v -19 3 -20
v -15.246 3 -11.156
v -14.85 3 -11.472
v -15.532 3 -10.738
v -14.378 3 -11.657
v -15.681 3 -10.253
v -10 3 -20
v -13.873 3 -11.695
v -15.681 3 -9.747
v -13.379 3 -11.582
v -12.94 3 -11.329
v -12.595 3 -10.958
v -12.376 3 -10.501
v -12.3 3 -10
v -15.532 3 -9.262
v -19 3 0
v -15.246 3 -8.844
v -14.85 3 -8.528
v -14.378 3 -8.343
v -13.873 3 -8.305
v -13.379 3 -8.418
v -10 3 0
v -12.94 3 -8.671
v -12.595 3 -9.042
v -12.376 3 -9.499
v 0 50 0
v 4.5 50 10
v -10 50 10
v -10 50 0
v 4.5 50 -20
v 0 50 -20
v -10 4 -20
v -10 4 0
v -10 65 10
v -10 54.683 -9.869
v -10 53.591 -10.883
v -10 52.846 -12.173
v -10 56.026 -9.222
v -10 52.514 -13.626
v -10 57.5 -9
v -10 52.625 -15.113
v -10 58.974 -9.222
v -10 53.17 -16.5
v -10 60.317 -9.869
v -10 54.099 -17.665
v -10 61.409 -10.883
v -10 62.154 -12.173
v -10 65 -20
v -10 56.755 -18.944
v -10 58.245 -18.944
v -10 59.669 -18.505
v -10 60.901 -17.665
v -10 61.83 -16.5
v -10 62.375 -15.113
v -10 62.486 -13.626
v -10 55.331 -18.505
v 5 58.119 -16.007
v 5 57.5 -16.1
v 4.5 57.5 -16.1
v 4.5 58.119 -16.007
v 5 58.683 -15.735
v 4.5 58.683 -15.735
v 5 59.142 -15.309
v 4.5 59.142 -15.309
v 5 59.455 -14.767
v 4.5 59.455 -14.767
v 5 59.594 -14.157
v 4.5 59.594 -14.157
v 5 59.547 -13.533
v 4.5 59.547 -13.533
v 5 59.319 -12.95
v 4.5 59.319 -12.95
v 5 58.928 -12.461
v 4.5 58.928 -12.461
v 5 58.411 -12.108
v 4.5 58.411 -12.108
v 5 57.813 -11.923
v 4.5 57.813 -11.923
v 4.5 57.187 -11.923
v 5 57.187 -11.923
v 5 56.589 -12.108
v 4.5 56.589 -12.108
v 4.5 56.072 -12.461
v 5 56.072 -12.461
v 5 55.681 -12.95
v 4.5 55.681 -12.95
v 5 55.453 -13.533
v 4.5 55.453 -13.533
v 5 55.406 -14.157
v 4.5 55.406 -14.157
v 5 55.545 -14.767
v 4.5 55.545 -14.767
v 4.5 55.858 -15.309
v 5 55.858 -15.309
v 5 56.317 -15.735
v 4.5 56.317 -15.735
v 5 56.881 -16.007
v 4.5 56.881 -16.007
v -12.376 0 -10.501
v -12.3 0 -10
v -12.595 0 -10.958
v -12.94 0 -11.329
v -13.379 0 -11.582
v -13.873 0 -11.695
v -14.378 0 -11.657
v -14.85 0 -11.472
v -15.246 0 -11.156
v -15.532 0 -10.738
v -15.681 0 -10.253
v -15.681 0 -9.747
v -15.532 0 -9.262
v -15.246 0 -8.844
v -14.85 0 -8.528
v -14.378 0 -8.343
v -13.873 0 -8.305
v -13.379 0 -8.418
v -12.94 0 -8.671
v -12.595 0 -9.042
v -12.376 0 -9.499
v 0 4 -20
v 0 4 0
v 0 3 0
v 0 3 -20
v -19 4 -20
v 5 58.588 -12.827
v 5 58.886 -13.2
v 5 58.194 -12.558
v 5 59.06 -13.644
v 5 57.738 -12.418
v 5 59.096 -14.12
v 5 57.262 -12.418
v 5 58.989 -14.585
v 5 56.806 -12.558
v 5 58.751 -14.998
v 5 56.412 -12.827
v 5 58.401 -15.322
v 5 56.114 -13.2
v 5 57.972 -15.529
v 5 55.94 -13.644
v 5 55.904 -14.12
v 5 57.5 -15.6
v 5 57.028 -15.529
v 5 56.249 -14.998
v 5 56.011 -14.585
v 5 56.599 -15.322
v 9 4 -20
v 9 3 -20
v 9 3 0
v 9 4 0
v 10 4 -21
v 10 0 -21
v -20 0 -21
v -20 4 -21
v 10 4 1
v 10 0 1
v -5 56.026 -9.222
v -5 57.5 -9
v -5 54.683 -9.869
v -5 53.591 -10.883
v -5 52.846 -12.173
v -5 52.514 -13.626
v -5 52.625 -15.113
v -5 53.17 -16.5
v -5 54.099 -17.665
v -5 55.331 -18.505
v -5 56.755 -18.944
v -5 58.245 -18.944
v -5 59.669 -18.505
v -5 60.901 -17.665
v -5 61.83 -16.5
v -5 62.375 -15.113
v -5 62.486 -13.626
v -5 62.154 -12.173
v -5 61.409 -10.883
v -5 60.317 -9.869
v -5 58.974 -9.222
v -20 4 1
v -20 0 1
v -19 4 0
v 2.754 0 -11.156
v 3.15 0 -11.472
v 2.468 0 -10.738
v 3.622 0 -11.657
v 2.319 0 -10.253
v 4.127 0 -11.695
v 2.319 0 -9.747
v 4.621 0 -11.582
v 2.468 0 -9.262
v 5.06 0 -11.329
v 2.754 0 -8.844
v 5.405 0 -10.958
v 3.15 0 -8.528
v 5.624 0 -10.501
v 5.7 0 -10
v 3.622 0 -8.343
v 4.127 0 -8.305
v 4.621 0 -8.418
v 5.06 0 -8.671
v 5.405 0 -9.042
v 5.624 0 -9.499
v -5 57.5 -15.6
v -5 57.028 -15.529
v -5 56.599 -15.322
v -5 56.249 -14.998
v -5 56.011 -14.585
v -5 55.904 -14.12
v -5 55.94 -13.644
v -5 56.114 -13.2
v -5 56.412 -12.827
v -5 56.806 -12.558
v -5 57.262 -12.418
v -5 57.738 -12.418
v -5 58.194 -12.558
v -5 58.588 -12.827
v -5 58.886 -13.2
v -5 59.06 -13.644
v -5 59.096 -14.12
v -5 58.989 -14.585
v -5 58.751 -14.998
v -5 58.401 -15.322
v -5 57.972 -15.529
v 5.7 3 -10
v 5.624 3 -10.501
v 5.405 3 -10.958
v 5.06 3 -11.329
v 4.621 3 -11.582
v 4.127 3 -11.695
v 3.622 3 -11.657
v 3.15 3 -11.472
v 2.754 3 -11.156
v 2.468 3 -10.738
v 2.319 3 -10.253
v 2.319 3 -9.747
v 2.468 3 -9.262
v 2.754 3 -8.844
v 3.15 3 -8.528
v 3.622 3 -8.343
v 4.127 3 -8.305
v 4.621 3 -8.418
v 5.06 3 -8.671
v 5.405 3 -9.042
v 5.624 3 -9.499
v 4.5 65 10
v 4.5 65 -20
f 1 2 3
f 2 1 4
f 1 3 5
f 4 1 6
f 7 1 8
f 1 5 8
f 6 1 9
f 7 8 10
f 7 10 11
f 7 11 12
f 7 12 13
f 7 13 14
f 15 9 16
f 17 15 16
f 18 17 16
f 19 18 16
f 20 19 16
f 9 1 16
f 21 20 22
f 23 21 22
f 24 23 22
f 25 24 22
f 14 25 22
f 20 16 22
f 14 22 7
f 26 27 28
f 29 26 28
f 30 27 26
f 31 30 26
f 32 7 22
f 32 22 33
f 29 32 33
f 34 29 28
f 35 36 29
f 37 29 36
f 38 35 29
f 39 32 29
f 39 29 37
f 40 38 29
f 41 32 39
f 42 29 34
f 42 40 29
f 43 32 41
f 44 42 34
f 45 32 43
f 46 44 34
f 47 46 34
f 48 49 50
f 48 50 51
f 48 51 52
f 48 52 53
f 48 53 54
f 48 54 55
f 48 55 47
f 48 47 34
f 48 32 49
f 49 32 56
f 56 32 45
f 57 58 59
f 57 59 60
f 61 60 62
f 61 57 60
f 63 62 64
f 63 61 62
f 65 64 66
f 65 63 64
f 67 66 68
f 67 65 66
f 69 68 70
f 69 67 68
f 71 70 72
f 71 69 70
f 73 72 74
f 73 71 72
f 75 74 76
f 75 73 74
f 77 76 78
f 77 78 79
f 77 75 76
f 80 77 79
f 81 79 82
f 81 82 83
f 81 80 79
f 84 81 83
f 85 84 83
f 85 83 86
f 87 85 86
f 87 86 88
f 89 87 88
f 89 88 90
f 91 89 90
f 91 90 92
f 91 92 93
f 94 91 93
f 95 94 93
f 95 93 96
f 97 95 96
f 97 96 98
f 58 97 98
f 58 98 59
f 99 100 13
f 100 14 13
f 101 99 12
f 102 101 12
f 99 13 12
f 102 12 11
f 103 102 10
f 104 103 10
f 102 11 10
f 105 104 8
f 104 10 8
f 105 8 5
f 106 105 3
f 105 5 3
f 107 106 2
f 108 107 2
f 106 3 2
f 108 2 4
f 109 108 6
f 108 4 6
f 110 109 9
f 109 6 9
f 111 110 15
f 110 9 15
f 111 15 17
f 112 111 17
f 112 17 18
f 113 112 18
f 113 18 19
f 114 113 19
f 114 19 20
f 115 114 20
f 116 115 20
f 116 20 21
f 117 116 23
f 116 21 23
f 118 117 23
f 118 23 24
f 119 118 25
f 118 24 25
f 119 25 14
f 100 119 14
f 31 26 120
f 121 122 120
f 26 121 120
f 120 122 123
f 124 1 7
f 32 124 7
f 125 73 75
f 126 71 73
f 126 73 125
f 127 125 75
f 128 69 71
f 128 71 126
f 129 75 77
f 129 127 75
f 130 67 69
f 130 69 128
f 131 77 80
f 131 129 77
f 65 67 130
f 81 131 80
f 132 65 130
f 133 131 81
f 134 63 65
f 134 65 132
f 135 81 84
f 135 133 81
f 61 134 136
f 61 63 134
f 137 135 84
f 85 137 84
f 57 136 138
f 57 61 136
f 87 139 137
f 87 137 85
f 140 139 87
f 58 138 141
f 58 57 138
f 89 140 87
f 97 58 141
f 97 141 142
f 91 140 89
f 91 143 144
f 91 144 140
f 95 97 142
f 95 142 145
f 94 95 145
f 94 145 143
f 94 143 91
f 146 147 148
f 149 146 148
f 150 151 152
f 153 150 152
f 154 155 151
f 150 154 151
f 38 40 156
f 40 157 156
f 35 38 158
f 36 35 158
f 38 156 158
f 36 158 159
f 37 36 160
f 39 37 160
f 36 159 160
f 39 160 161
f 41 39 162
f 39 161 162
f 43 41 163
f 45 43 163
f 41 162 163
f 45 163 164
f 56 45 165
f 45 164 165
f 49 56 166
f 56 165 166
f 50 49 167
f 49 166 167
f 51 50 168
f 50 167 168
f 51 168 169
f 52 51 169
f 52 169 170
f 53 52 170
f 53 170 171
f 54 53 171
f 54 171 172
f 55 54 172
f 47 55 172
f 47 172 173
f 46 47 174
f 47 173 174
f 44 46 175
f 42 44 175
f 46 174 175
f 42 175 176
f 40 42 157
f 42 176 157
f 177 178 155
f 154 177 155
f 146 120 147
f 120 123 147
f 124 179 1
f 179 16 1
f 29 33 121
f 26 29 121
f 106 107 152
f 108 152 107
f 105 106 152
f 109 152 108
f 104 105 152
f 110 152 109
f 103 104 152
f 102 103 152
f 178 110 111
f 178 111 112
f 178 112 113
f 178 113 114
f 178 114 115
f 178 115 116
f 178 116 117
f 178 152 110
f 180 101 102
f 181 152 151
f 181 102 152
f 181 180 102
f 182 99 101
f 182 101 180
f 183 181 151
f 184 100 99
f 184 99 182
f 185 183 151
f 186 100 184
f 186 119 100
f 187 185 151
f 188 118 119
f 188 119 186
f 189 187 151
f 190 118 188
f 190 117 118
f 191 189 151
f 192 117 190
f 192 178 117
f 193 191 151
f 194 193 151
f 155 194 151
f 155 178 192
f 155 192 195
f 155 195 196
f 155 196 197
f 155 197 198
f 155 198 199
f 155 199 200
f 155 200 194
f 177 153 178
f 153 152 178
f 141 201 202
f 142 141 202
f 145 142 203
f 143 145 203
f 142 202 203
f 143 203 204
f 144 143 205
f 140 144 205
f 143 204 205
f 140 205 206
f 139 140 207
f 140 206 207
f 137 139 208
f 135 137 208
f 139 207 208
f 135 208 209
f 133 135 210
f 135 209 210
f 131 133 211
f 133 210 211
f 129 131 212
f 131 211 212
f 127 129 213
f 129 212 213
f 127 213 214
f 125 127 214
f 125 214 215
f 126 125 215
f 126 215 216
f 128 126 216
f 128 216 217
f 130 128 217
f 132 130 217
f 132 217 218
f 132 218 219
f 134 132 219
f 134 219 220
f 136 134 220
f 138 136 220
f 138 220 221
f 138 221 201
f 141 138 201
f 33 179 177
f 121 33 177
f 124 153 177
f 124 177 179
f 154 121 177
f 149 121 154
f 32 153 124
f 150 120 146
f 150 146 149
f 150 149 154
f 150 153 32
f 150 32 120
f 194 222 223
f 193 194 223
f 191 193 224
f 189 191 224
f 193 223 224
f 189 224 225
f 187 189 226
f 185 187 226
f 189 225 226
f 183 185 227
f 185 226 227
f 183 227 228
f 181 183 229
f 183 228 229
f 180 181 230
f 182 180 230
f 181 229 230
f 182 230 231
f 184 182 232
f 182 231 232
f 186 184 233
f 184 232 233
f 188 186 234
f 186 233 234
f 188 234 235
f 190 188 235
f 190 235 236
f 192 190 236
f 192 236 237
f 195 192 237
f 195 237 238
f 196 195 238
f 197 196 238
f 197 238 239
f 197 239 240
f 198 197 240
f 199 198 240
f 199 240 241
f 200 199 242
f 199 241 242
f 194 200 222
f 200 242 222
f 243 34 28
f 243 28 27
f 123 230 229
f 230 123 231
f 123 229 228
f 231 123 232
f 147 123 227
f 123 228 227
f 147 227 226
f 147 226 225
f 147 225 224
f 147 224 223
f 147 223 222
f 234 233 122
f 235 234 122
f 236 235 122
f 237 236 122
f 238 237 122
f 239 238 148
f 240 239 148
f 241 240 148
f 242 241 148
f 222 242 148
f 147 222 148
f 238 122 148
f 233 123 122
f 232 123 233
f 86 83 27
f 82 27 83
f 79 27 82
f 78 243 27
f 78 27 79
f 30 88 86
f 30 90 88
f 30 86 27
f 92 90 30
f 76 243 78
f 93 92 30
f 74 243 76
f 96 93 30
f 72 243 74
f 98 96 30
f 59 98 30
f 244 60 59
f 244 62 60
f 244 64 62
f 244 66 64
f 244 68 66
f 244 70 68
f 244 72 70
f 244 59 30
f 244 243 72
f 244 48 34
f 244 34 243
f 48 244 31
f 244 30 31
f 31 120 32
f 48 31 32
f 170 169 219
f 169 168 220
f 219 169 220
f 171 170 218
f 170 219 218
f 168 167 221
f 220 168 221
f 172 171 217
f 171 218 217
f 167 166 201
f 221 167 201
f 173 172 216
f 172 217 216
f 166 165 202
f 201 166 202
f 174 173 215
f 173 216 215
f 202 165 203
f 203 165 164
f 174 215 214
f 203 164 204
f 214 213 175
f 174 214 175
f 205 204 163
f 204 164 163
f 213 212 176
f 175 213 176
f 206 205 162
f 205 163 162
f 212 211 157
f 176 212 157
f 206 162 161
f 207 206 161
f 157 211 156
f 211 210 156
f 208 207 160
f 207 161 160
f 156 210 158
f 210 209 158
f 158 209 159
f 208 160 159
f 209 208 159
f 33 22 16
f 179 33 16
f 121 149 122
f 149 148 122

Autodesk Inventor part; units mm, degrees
ref_plane "YZ Plane" through (0, 0, 0) normal (1, 0, 0) x (0, 1, 0)
ref_plane "XZ Plane" through (0, 0, 0) normal (0, 1, 0) x (-1, 0, 0)
ref_plane "XY Plane" through (0, 0, 0) normal (0, 0, 1) x (1, 0, 0)
sketch "base" plane through (0, 0, 0) normal (0, 1, 0) x (-1, 0, 0)
  line L0 (0, 0) -> (0, -20)
  line L1 (0, -20) -> (10, -20)
  line L2 (10, -20) -> (10, 0)
  line L3 (10, 0) -> (0, 0)
  dimension "d186" = 20
  dimension "d187" = 10
extrude "Extrusión29" add sketch "base" along normal blind 50
sketch "Boceto41" plane through (0, 50, 0) normal (0, 1, 0) x (1, 0, 0)
  line L0 (0, 20) -> (5, 20)
  line L1 (5, 20) -> (5, 0)
  line L2 (-10, 0) -> (0, 0) projected
  line L3 (5, 0) -> (-10, 0)
  line L4 (-10, 0) -> (-10, 20)
  line L5 (-10, 20) -> (5, 20)
  dimension "d190" = 5
extrude "Extrusión30" add sketch "Boceto41" along normal blind 15
sketch "Boceto42" plane through (-10, 0, 0) normal (0, 0, 1) x (1, 0, 0)
  line L0 (15, 50) -> (10, 50) projected
  line L1 (15, 50) -> (0, 50)
  line L2 (0, 0) -> (0, 65) projected
  line L3 (0, 50) -> (0, 65)
  line L4 (0, 65) -> (15, 65) projected
  line L5 (0, 65) -> (15, 65)
  line L6 (15, 65) -> (15, 50)
  point P0 (10, 0)
extrude "Extrusión31" add sketch "Boceto42" along normal blind 10
sketch "Boceto45" plane through (5, 50, -20) normal (1, 0, 0) x (0, 0, -1)
  line L0 (0, -50) -> (0, 15) projected
  line L1 (0, 0) -> (0, 15)
  line L2 (0, 7.5) -> (-6, 7.5)
  point P0 (-20, -50)
  dimension "d200" = 6
hole "Agujero1" at (5, 57.5, -14) direction (-1, 0, 0) diameter 3.2 end through all
sketch "Boceto51" plane through (-10, 0, -20) normal (-1, 0, 0) x (0, 0, 1)
  circle A0 centre (6, 57.5) radius 1.6 projected
  circle A1 centre (6, 57.5) radius 1.6
  point P0 (20, 0)
hole "Agujero2" at (-10, 57.5, -14) direction (1, 0, 0) diameter 3.2 depth 30 counterbore diameter 10 counterbore depth 5
sketch "Boceto52" plane through (0, 0, 0) normal (0, -1, 0) x (1, 0, 0)
  line L0 (0, 0) -> (0, -20) projected
  line L1 (10, 0) -> (10, -20)
  line L2 (-10, 0) -> (0, 0) projected
  line L3 (-20, 0) -> (-20, -20)
  line L4 (-20, -20) -> (-20, -21)
  line L5 (-20, 0) -> (-20, 1)
  line L6 (10, 0) -> (10, 1)
  line L7 (10, -20) -> (10, -21)
  line L8 (10, -21) -> (-20, -21)
  line L9 (10, 1) -> (-20, 1)
  dimension "d237" = 10
  dimension "d238" = 20
  dimension "d239" = 10
  dimension "d240" = 20
  dimension "d241" = 1
  dimension "d242" = 1
  dimension "d244" = 1
extrude "Extrusión36" add sketch "Boceto52" against normal blind 3
sketch "Boceto53" plane through (0, 3, 0) normal (0, 1, 0) x (1, 0, 0)
  line L0 (-20, 21) -> (-20, -1) projected
  line L1 (-19, 0) -> (-19, 20)
  line L2 (-19, 20) -> (9, 20)
  line L3 (9, 20) -> (9, 0)
  line L4 (9, 0) -> (-19, 0)
  line L5 (-20, 21) -> (-20, -1) projected
  line L6 (10, -1) -> (10, 21) projected
  line L7 (-20, -1) -> (10, -1)
  line L8 (10, -1) -> (10, 21)
  line L9 (10, 21) -> (-20, 21)
  line L10 (-20, 21) -> (-20, -1)
  point P0 (0, 0)
  dimension "d248" = 20
  dimension "d249" = 28
  dimension "d250" = 20
extrude "Extrusión37" add sketch "Boceto53" along normal blind 1
sketch "Boceto54" plane through (0, 3, 0) normal (0, 1, 0) x (1, 0, 0)
  circle A0 centre (-14, 10) radius 1.7
  circle A1 centre (4, 10) radius 1.7
  dimension "d259" = 3.4
  dimension "d261" = 3.4
extrude "Extrusión38" cut sketch "Boceto54" against normal blind 39
sketch "Boceto55" plane through (5, 50, -20) normal (1, 0, 0) x (0, 0, -1)
  line L0 (-30, 15) -> (-30, 0) projected
  line L1 (0, 15) -> (-30, 15)
  line L2 (-30, 15) -> (-30, 0)
  line L3 (-30, 0) -> (0, 0)
  line L4 (0, 0) -> (0, 15)
  circle A0 centre (-6, 7.5) radius 1.6
  circle A1 centre (-6, 7.5) radius 2.1
  point P0 (-20, -50)
  dimension "d264" = 4.2
extrude "Extrusión39" cut sketch "Boceto55" against normal blind 0.5 contours L1 L4 L3 L0
properties part number "detector curvament fil"
